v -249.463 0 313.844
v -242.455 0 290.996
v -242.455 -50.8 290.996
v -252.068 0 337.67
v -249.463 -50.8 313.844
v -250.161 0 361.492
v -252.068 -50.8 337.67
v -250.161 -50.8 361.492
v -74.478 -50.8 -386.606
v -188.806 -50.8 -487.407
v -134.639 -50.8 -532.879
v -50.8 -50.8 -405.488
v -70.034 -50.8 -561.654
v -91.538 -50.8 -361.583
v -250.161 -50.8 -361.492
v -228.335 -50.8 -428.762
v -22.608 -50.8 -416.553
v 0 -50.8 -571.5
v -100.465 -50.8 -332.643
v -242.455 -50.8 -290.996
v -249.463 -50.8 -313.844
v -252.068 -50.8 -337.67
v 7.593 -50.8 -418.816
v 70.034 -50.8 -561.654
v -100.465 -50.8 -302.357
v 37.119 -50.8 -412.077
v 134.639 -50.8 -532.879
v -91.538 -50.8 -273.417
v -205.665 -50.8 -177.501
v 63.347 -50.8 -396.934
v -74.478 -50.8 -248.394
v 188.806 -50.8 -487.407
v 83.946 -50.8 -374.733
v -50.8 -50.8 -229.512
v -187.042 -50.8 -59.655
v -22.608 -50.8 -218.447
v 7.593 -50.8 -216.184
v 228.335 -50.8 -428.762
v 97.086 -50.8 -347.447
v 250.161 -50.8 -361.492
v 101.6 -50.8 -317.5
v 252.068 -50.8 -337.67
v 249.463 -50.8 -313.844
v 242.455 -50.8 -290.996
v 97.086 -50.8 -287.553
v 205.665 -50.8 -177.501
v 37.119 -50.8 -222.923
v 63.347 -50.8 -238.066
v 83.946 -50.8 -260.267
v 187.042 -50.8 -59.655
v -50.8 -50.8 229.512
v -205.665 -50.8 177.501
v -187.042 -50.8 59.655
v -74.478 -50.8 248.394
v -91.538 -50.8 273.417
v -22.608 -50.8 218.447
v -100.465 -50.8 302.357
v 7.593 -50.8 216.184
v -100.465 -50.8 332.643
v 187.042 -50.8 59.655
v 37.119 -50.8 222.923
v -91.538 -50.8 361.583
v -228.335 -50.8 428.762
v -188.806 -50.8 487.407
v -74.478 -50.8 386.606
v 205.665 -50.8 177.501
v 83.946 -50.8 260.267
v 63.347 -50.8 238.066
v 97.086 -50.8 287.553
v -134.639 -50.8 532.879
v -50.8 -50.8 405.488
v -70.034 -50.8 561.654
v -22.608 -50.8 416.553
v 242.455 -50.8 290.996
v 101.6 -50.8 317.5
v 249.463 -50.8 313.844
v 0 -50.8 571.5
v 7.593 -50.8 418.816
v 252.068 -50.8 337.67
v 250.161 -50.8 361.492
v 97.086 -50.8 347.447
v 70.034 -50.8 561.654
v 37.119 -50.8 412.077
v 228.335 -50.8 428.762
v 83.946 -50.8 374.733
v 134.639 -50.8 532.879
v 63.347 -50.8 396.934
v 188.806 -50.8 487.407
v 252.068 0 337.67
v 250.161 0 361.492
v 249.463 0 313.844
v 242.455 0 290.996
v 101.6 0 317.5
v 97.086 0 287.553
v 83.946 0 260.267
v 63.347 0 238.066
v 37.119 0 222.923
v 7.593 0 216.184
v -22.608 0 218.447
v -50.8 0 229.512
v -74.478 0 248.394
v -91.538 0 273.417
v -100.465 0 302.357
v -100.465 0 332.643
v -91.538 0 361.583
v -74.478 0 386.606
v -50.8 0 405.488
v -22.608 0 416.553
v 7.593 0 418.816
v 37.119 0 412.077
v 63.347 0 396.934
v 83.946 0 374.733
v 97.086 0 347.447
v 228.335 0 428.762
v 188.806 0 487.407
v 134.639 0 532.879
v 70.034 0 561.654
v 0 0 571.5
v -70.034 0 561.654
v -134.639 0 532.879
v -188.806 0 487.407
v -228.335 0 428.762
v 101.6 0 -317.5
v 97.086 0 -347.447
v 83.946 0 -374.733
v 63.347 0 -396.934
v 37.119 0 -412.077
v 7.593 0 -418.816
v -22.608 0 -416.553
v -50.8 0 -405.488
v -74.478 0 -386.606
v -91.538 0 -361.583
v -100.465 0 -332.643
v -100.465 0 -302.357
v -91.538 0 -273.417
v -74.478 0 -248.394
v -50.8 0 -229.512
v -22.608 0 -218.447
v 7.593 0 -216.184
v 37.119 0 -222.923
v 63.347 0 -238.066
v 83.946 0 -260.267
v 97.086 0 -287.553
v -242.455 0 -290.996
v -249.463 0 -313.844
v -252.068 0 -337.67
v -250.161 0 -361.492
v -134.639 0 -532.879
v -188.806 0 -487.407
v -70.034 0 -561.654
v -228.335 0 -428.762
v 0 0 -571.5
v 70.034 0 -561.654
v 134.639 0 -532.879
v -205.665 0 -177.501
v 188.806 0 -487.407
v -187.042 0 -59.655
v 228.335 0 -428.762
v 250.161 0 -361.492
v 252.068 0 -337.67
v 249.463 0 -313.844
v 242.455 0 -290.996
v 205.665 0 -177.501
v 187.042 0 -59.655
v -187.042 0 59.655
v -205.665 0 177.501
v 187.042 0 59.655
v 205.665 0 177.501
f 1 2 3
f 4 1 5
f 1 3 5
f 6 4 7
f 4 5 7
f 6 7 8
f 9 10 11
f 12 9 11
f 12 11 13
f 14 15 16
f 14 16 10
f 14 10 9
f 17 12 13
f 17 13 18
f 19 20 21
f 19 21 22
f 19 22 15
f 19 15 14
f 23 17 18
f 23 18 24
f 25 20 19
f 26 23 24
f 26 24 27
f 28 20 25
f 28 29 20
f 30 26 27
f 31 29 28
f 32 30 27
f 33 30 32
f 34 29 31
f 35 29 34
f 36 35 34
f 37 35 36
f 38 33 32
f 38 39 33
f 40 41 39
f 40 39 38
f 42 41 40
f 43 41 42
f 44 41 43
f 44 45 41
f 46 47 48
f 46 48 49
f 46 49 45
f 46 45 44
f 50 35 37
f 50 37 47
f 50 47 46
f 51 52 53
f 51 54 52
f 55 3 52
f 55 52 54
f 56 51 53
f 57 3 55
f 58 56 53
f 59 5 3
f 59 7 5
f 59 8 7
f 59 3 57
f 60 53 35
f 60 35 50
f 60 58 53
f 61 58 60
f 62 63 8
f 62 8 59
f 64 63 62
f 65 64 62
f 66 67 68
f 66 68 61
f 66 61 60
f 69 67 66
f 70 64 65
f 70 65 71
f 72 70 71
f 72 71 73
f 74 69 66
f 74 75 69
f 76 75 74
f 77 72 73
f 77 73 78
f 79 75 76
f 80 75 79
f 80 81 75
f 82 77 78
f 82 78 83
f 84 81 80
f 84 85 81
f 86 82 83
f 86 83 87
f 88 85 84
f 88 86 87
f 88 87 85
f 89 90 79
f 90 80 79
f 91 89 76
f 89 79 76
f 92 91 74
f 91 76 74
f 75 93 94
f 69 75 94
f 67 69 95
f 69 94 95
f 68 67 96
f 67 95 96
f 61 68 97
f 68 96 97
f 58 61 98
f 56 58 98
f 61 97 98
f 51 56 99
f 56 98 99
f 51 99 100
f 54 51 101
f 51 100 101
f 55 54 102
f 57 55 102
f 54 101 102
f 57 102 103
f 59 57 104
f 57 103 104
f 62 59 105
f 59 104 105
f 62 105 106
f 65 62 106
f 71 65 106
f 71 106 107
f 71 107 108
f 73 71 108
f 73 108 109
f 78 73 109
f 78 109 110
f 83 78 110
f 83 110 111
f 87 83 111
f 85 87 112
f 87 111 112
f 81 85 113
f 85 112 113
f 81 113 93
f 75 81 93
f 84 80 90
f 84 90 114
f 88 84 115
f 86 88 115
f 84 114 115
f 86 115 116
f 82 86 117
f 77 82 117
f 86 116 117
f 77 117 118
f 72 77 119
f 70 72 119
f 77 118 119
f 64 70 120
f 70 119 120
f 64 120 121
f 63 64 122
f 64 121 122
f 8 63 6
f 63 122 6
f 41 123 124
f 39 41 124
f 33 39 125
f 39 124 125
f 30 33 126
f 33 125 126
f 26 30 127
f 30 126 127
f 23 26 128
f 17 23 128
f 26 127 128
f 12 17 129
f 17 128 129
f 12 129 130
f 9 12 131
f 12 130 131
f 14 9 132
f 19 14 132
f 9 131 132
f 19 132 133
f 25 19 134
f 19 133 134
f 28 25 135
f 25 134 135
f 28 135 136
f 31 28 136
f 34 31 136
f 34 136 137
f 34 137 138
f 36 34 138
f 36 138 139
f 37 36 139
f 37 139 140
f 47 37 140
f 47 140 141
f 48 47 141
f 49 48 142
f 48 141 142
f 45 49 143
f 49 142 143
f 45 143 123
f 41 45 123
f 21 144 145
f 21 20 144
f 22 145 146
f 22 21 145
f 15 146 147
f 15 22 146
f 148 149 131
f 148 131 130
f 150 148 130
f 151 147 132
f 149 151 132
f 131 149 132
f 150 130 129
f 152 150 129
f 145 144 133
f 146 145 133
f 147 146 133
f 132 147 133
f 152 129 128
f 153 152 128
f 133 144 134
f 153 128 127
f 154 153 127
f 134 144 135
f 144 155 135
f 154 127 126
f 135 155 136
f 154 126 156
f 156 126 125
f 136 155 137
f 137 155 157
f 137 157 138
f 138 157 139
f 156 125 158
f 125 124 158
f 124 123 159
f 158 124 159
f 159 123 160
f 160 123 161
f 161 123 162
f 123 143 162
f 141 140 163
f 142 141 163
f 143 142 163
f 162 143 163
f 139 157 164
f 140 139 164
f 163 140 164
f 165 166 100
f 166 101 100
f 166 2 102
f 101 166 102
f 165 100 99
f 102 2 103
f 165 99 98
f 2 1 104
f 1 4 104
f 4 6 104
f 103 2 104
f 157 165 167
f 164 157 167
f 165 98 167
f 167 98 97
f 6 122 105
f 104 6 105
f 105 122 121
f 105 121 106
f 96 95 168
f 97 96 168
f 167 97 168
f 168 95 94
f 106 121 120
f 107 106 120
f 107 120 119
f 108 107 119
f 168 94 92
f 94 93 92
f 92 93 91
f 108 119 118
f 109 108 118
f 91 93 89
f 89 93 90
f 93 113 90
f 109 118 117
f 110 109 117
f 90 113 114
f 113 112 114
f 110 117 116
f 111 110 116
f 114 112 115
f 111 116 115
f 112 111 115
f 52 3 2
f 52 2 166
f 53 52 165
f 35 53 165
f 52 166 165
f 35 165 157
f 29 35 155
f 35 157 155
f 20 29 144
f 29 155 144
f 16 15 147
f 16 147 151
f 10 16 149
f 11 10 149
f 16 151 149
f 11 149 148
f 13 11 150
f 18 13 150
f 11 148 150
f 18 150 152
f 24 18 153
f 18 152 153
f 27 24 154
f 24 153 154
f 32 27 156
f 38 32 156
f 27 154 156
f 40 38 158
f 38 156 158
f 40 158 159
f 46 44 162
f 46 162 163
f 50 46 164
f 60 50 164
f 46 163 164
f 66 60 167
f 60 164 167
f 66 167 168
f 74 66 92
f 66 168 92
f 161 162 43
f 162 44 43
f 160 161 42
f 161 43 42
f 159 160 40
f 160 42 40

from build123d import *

# Parameters (mm, degrees)
F1_DEPTH = 50.8
F2_R     = 127
F3_R     = 127
F4_R     = 127
F5_R     = 127


with BuildPart() as f1:
    # F0 (on Front) → F1 (new body)
    with BuildSketch(Plane.XZ):
        with BuildLine():
            Line((101.6, 317.5), (254, 317.5))
            ThreePointArc((254, 317.5), (0, 571.5), (-254, 317.5))
            Line((-254, 317.5), (-101.6, 317.5))
            ThreePointArc((-101.6, 317.5), (0, 419.1), (101.6, 317.5))
        make_face()
        with BuildLine():
            ThreePointArc((254, -317.5), (184.7032192794, 0), (254, 317.5))
            Line((254, 317.5), (101.6, 317.5))
            ThreePointArc((101.6, 317.5), (0, 215.9), (-101.6, 317.5))
            Line((-101.6, 317.5), (-254, 317.5))
            ThreePointArc((-254, 317.5), (-184.7032192794, 0), (-254, -317.5))
            Line((-254, -317.5), (-101.6, -317.5))
            ThreePointArc((-101.6, -317.5), (0, -215.9), (101.6, -317.5))
            Line((101.6, -317.5), (254, -317.5))
        make_face()
        with BuildLine():
            ThreePointArc((-254, -317.5), (0, -571.5), (254, -317.5))
            Line((254, -317.5), (101.6, -317.5))
            ThreePointArc((101.6, -317.5), (0, -419.1), (-101.6, -317.5))
            Line((-101.6, -317.5), (-254, -317.5))
        make_face()
    extrude(amount=F1_DEPTH)

    # F2
    f2_edges = [f1.edges().sort_by_distance(p)[0] for p in [
        (-254, -25.4, -317.5),
    ]]
    fillet(f2_edges, radius=F2_R)

    # F3
    f3_edges = [f1.edges().sort_by_distance(p)[0] for p in [
        (-254, -25.4, 317.5),
    ]]
    fillet(f3_edges, radius=F3_R)

    # F4
    f4_edges = [f1.edges().sort_by_distance(p)[0] for p in [
        (254, -25.4, 317.5),
    ]]
    fillet(f4_edges, radius=F4_R)

    # F5
    f5_edges = [f1.edges().sort_by_distance(p)[0] for p in [
        (254, -25.4, -317.5),
    ]]
    fillet(f5_edges, radius=F5_R)


solid = f1.part
